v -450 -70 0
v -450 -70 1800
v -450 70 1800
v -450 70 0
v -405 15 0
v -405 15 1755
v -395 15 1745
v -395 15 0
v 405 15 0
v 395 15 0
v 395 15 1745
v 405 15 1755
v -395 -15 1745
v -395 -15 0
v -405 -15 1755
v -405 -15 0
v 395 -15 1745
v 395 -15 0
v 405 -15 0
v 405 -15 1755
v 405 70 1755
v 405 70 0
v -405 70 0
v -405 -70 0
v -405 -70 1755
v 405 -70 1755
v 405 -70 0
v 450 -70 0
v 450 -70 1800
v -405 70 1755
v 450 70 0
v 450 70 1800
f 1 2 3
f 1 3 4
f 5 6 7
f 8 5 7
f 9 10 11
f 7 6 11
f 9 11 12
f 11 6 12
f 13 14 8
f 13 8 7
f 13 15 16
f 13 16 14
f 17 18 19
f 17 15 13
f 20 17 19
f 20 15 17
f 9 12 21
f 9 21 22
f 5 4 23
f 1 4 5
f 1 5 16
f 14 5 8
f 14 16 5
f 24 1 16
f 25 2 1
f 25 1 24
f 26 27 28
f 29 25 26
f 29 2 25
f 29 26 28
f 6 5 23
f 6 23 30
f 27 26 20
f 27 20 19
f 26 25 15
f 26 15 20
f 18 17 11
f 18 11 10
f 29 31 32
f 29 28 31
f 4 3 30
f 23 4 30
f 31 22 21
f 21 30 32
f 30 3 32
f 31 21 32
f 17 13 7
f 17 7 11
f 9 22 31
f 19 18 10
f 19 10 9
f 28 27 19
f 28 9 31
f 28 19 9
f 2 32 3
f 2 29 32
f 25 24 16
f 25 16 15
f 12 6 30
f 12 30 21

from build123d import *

# Parameters (mm, degrees)
F1_DEPTH = 70
F3_DEPTH = 15


with BuildPart() as f1:
    # F0 (on Front) → F1 (new body, symmetric)
    with BuildSketch(Plane.XZ):
        Polygon((450, 1800), (-450, 1800), (-450, 0), (-405, 0), (-405, 1755), (405, 1755), (405, 0), (450, 0), align=None)
    extrude(amount=F1_DEPTH, both=True)

    # F2 (on Front) → F3 (join, symmetric)
    with BuildSketch(Plane.XZ):
        Polygon((405, 1755), (-405, 1755), (-405, 0), (-395, 0), (-395, 1745), (395, 1745), (395, 0), (405, 0), align=None)
    extrude(amount=F3_DEPTH, both=True)


solid = f1.part
